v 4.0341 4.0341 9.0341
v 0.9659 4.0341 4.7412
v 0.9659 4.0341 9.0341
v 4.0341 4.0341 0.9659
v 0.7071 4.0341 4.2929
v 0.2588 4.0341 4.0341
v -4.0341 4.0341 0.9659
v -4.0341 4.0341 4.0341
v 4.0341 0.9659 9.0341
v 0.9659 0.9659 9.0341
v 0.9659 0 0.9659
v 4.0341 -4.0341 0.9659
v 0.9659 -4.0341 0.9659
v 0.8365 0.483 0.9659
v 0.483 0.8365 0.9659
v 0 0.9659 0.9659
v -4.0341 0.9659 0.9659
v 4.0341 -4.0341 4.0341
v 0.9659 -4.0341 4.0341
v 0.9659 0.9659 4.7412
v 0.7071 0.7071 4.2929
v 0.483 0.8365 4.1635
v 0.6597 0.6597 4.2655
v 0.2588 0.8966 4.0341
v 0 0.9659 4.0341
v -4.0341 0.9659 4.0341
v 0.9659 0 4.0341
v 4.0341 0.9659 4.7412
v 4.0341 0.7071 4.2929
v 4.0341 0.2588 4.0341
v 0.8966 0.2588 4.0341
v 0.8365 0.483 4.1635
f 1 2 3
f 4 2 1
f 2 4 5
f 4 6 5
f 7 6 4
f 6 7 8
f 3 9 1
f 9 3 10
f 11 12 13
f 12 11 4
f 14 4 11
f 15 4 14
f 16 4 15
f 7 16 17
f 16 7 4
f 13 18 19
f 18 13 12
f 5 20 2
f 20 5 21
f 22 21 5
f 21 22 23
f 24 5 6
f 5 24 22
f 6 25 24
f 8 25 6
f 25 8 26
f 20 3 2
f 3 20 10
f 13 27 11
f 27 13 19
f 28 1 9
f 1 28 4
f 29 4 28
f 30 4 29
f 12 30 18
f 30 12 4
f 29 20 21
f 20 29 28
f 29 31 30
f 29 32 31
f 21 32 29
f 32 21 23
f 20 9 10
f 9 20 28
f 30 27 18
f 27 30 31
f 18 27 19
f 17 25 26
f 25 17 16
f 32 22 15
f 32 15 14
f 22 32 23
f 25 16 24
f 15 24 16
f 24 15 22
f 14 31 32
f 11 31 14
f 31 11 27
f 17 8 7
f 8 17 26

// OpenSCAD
// Volume: 171.9753427079283, SurfaceArea: 237.96258274428857
module erode(r) {
    difference() {
        children();
        minkowski(convexity=3) {
            difference() {
                cube(25, center=true);
                children();
            }
            sphere(r);
        }
    }
}

module object() {
    translate([-5,0,0]) cube([10,5,5]);
    translate([0,-5,0]) cube([5,10,5]);
    cube([5,5,10]);
}

erode(1,$fn=12) object();
